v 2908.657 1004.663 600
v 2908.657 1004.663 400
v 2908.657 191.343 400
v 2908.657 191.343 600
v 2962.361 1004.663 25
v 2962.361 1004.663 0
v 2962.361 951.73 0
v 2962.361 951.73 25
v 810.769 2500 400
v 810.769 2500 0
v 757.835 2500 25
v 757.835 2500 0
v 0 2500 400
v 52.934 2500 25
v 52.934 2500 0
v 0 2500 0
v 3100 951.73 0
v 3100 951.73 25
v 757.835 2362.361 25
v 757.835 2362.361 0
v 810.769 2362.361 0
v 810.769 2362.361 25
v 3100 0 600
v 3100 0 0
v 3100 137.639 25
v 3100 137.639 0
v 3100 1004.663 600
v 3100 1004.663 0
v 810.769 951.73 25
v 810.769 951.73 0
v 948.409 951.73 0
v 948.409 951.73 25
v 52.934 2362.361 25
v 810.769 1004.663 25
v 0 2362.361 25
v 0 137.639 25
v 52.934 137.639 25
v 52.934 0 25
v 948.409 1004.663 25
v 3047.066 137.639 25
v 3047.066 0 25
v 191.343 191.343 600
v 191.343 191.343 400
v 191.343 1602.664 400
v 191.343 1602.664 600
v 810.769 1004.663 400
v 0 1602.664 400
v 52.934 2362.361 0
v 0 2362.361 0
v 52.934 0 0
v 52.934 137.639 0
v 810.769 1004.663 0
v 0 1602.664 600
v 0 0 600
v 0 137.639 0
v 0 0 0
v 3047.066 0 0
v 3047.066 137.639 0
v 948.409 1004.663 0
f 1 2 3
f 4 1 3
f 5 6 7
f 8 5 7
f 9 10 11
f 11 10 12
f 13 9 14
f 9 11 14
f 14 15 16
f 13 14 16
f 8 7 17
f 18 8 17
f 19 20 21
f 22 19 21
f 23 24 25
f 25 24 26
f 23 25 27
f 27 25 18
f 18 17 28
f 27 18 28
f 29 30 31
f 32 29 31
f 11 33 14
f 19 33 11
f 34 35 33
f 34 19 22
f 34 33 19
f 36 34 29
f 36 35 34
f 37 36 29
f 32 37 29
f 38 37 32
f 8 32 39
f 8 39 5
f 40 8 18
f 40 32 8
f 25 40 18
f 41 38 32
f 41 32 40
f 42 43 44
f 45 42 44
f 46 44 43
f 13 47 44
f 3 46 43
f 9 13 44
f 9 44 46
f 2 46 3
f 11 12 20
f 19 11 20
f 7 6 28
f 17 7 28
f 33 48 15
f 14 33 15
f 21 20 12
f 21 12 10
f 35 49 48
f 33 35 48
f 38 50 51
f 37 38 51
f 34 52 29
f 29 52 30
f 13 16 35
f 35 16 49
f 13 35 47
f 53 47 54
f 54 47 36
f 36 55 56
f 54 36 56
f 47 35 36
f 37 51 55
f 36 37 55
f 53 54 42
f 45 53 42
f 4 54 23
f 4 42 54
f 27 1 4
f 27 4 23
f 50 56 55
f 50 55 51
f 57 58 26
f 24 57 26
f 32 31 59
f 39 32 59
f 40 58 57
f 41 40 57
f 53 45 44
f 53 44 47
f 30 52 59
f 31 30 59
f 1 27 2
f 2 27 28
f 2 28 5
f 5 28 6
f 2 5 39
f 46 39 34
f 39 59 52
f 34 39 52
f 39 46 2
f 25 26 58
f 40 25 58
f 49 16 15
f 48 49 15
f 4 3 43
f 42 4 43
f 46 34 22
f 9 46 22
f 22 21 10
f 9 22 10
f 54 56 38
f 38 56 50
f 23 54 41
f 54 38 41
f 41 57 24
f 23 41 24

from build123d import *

# Parameters (mm, degrees)
F1_DEPTH = 400
F3_DEPTH = 25
F5_DEPTH = 200


with BuildPart() as f1:
    # F0 (on Top) → F1 (new body)
    with BuildSketch(Plane.XY):
        Polygon((0, 2500), (0, 0), (3100, 0), (3100, 1004.663332), (810.769223, 1004.663332), (810.769223, 2500), align=None)
    extrude(amount=F1_DEPTH)

    # F2 (on face) → F3 (cut)
    with BuildSketch(Plane(origin=(0, 0, 0), x_dir=(1, 0, 0), z_dir=(0, 0, -1))):
        Polygon((3047.066211, 0), (52.933789, 0), (52.933789, -137.639437), (0, -137.639437), (0, -2362.360563), (52.933789, -2362.360563), (52.933789, -2500), (757.835435, -2500), (757.835435, -2362.360563), (810.769223, -2362.360563), (810.769223, -1004.663332), (810.769223, -951.729543), (948.40866, -951.729543), (948.40866, -1004.663332), (2962.360563, -1004.663332), (2962.360563, -951.729543), (3100, -951.729543), (3100, -137.639437), (3047.066211, -137.639437), align=None)
    extrude(amount=-F3_DEPTH, mode=Mode.SUBTRACT)

    # F4 (on face) → F5 (join)
    with BuildSketch(Plane.XY.offset(400)):
        Polygon((0, 1602.663875), (0, 0), (3100, 0), (3100, 1004.663332), (2908.657169, 1004.663332), (2908.657169, 191.342831), (191.342831, 191.342831), (191.342831, 1602.663875), align=None)
    extrude(amount=F5_DEPTH)


solid = f1.part
